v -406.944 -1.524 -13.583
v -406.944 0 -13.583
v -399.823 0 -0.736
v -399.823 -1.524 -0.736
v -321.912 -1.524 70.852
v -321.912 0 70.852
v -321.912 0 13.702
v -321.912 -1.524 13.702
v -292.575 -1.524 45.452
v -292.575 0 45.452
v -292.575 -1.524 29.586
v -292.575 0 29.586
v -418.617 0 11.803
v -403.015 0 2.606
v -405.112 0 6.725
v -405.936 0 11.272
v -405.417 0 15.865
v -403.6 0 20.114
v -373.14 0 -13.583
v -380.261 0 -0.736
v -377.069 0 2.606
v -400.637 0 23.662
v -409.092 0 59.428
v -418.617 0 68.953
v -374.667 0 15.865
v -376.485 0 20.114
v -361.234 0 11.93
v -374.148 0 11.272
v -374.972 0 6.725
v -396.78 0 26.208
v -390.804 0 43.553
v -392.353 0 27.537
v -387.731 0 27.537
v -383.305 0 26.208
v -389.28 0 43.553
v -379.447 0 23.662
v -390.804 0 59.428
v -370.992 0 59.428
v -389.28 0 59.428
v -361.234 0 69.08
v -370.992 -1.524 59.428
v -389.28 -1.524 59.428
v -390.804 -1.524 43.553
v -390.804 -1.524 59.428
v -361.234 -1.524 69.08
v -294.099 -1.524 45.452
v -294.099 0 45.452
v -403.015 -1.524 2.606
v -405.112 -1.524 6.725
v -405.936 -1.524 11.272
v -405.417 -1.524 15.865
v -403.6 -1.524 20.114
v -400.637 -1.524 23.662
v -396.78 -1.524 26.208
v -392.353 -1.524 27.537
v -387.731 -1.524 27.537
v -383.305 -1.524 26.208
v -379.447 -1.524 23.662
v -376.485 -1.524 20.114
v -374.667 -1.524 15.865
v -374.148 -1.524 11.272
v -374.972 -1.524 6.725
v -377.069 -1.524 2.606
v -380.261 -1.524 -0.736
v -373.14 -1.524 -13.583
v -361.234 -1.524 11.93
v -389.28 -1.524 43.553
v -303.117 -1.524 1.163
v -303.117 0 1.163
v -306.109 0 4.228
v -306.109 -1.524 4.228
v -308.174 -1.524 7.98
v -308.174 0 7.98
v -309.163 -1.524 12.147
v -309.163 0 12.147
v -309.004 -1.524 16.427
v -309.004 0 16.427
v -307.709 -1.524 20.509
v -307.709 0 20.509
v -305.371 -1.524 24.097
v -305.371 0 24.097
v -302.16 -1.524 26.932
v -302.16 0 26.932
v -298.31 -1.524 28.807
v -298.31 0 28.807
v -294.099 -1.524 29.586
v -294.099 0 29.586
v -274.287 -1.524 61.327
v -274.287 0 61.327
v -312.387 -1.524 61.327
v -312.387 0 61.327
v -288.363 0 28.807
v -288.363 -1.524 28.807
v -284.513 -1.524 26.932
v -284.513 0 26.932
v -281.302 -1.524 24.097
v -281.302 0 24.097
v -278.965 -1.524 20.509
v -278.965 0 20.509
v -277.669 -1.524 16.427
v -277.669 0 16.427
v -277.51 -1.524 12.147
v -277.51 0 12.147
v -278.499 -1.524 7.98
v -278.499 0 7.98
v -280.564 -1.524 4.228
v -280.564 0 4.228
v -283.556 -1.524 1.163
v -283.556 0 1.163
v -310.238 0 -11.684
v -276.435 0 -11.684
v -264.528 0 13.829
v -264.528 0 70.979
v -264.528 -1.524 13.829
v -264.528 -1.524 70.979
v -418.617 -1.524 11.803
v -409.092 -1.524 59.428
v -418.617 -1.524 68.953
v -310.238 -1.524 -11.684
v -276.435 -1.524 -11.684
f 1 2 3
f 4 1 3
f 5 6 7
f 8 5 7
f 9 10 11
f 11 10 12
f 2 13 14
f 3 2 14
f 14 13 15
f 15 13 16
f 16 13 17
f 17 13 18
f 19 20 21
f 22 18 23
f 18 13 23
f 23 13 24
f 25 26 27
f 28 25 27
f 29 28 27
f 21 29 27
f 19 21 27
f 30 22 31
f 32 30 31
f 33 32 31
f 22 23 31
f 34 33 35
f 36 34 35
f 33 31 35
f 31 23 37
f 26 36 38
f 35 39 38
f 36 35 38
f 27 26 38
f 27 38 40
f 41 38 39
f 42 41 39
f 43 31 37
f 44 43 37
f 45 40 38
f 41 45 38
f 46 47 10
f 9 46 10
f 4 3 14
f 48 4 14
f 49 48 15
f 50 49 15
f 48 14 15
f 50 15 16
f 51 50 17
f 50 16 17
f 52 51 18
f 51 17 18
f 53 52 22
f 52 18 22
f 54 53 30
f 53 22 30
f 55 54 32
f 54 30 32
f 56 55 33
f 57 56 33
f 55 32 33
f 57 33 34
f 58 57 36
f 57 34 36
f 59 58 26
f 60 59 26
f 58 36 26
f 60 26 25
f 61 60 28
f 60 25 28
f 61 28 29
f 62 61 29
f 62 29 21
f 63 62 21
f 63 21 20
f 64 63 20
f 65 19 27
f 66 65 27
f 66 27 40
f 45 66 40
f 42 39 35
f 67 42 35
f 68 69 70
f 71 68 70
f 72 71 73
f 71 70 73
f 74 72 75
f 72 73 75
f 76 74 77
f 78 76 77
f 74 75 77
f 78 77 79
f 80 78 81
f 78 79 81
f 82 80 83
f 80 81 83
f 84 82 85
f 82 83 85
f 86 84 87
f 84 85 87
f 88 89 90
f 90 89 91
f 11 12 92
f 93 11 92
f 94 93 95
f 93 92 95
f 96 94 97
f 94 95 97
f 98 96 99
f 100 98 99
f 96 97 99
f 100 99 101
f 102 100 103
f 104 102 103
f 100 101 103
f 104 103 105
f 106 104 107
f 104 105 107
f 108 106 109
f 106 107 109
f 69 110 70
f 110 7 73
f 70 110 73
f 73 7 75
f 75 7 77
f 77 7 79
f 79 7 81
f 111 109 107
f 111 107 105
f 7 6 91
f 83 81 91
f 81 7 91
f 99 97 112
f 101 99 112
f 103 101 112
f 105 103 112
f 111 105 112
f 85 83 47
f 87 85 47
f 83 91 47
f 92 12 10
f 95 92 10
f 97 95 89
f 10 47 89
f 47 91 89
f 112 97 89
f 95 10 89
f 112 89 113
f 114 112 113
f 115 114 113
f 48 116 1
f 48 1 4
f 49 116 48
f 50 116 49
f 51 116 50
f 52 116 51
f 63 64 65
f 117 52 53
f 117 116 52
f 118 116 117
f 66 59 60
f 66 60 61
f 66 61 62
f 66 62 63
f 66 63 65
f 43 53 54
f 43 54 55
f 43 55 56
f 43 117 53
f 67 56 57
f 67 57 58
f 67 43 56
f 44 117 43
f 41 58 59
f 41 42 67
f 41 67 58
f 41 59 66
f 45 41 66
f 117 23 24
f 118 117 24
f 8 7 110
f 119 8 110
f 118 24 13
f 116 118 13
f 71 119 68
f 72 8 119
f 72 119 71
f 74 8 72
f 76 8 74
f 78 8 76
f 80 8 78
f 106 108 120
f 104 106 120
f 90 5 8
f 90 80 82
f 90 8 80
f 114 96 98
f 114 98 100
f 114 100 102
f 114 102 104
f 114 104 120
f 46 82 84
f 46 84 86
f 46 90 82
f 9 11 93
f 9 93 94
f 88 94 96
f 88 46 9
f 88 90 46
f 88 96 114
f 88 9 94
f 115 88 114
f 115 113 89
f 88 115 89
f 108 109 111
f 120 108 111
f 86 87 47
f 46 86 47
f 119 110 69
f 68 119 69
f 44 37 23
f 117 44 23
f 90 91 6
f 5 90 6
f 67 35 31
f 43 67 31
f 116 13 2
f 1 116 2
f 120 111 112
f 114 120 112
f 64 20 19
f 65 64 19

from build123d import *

# Parameters (mm, degrees)
F1_DEPTH = 1.524


# Not quite as in the source:
# - a feature names something its author has since deleted; it is built from what else it names


with BuildPart() as f1:
    # F0 (on Front) → F1 (new body)
    with BuildSketch(Plane.XZ):
        with BuildLine():
            ThreePointArc((-399.8226737201, -0.736120695), (-390.0420399189, 27.705359182), (-380.2614061177, -0.736120695))
            Line((-380.2614061177, -0.736120695), (-373.1401919201, -13.583131183))
            Line((-373.1401919201, -13.583131183), (-361.2339419201, 11.9302616742))
            Line((-361.2339419201, 11.9302616742), (-361.2339419201, 59.5552616742))
            Line((-361.2339419201, 59.5552616742), (-361.2339419201, 69.0802616742))
            Line((-361.2339419201, 69.0802616742), (-370.9920399189, 59.4279065132))
            Line((-370.9920399189, 59.4279065132), (-389.2800399189, 59.4279065132))
            Line((-389.2800399189, 59.4279065132), (-389.2800399189, 43.5529065132))
            Line((-389.2800399189, 43.5529065132), (-390.0420399189, 43.5529065132))
            Line((-390.0420399189, 43.5529065132), (-390.8040399189, 43.5529065132))
            Line((-390.8040399189, 43.5529065132), (-390.8040399189, 59.4279065132))
            Line((-390.8040399189, 59.4279065132), (-409.0920399189, 59.4279065132))
            Line((-409.0920399189, 59.4279065132), (-418.6170399189, 68.9529065132))
            Line((-418.6170399189, 68.9529065132), (-418.6170399189, 59.4279065132))
            Line((-418.6170399189, 59.4279065132), (-418.6170399189, 11.8029065132))
            Line((-418.6170399189, 11.8029065132), (-406.9438879177, -13.583131183))
            Line((-406.9438879177, -13.583131183), (-399.8226737201, -0.736120695))
        make_face()
    extrude(amount=F1_DEPTH)


with BuildPart() as f1b:
    # F0 (on Front) → F1, piece 2 (new body)
    with BuildSketch(Plane.XZ):
        with BuildLine():
            ThreePointArc((-292.5745729645, 29.5862229522), (-278.1788508217, 18.5115548851), (-283.5559391633, 1.1630099959))
            Line((-283.5559391633, 1.1630099959), (-276.4347249657, -11.6840004921))
            Line((-276.4347249657, -11.6840004921), (-264.5284749657, 13.8293923651))
            Line((-264.5284749657, 13.8293923651), (-264.5284749657, 61.4543923651))
            Line((-264.5284749657, 61.4543923651), (-264.5284749657, 70.9793923651))
            Line((-264.5284749657, 70.9793923651), (-274.2865729645, 61.3270372041))
            Line((-274.2865729645, 61.3270372041), (-312.3865729645, 61.3270372041))
            Line((-312.3865729645, 61.3270372041), (-321.9115729645, 70.8520372041))
            Line((-321.9115729645, 70.8520372041), (-321.9115729645, 61.3270372041))
            Line((-321.9115729645, 61.3270372041), (-321.9115729645, 13.7020372041))
            Line((-321.9115729645, 13.7020372041), (-310.2384209633, -11.6840004921))
            Line((-310.2384209633, -11.6840004921), (-303.1172067657, 1.1630099959))
            ThreePointArc((-303.1172067657, 1.1630099959), (-308.4942951073, 18.5115548851), (-294.0985729645, 29.5862229522))
            Line((-294.0985729645, 29.5862229522), (-294.0985729645, 45.4520372041))
            Line((-294.0985729645, 45.4520372041), (-293.3365729645, 45.4520372041))
            Line((-293.3365729645, 45.4520372041), (-292.5745729645, 45.4520372041))
            Line((-292.5745729645, 45.4520372041), (-292.5745729645, 29.5862229522))
        make_face()
    extrude(amount=F1_DEPTH)


solid = Compound([f1.part, f1b.part])
